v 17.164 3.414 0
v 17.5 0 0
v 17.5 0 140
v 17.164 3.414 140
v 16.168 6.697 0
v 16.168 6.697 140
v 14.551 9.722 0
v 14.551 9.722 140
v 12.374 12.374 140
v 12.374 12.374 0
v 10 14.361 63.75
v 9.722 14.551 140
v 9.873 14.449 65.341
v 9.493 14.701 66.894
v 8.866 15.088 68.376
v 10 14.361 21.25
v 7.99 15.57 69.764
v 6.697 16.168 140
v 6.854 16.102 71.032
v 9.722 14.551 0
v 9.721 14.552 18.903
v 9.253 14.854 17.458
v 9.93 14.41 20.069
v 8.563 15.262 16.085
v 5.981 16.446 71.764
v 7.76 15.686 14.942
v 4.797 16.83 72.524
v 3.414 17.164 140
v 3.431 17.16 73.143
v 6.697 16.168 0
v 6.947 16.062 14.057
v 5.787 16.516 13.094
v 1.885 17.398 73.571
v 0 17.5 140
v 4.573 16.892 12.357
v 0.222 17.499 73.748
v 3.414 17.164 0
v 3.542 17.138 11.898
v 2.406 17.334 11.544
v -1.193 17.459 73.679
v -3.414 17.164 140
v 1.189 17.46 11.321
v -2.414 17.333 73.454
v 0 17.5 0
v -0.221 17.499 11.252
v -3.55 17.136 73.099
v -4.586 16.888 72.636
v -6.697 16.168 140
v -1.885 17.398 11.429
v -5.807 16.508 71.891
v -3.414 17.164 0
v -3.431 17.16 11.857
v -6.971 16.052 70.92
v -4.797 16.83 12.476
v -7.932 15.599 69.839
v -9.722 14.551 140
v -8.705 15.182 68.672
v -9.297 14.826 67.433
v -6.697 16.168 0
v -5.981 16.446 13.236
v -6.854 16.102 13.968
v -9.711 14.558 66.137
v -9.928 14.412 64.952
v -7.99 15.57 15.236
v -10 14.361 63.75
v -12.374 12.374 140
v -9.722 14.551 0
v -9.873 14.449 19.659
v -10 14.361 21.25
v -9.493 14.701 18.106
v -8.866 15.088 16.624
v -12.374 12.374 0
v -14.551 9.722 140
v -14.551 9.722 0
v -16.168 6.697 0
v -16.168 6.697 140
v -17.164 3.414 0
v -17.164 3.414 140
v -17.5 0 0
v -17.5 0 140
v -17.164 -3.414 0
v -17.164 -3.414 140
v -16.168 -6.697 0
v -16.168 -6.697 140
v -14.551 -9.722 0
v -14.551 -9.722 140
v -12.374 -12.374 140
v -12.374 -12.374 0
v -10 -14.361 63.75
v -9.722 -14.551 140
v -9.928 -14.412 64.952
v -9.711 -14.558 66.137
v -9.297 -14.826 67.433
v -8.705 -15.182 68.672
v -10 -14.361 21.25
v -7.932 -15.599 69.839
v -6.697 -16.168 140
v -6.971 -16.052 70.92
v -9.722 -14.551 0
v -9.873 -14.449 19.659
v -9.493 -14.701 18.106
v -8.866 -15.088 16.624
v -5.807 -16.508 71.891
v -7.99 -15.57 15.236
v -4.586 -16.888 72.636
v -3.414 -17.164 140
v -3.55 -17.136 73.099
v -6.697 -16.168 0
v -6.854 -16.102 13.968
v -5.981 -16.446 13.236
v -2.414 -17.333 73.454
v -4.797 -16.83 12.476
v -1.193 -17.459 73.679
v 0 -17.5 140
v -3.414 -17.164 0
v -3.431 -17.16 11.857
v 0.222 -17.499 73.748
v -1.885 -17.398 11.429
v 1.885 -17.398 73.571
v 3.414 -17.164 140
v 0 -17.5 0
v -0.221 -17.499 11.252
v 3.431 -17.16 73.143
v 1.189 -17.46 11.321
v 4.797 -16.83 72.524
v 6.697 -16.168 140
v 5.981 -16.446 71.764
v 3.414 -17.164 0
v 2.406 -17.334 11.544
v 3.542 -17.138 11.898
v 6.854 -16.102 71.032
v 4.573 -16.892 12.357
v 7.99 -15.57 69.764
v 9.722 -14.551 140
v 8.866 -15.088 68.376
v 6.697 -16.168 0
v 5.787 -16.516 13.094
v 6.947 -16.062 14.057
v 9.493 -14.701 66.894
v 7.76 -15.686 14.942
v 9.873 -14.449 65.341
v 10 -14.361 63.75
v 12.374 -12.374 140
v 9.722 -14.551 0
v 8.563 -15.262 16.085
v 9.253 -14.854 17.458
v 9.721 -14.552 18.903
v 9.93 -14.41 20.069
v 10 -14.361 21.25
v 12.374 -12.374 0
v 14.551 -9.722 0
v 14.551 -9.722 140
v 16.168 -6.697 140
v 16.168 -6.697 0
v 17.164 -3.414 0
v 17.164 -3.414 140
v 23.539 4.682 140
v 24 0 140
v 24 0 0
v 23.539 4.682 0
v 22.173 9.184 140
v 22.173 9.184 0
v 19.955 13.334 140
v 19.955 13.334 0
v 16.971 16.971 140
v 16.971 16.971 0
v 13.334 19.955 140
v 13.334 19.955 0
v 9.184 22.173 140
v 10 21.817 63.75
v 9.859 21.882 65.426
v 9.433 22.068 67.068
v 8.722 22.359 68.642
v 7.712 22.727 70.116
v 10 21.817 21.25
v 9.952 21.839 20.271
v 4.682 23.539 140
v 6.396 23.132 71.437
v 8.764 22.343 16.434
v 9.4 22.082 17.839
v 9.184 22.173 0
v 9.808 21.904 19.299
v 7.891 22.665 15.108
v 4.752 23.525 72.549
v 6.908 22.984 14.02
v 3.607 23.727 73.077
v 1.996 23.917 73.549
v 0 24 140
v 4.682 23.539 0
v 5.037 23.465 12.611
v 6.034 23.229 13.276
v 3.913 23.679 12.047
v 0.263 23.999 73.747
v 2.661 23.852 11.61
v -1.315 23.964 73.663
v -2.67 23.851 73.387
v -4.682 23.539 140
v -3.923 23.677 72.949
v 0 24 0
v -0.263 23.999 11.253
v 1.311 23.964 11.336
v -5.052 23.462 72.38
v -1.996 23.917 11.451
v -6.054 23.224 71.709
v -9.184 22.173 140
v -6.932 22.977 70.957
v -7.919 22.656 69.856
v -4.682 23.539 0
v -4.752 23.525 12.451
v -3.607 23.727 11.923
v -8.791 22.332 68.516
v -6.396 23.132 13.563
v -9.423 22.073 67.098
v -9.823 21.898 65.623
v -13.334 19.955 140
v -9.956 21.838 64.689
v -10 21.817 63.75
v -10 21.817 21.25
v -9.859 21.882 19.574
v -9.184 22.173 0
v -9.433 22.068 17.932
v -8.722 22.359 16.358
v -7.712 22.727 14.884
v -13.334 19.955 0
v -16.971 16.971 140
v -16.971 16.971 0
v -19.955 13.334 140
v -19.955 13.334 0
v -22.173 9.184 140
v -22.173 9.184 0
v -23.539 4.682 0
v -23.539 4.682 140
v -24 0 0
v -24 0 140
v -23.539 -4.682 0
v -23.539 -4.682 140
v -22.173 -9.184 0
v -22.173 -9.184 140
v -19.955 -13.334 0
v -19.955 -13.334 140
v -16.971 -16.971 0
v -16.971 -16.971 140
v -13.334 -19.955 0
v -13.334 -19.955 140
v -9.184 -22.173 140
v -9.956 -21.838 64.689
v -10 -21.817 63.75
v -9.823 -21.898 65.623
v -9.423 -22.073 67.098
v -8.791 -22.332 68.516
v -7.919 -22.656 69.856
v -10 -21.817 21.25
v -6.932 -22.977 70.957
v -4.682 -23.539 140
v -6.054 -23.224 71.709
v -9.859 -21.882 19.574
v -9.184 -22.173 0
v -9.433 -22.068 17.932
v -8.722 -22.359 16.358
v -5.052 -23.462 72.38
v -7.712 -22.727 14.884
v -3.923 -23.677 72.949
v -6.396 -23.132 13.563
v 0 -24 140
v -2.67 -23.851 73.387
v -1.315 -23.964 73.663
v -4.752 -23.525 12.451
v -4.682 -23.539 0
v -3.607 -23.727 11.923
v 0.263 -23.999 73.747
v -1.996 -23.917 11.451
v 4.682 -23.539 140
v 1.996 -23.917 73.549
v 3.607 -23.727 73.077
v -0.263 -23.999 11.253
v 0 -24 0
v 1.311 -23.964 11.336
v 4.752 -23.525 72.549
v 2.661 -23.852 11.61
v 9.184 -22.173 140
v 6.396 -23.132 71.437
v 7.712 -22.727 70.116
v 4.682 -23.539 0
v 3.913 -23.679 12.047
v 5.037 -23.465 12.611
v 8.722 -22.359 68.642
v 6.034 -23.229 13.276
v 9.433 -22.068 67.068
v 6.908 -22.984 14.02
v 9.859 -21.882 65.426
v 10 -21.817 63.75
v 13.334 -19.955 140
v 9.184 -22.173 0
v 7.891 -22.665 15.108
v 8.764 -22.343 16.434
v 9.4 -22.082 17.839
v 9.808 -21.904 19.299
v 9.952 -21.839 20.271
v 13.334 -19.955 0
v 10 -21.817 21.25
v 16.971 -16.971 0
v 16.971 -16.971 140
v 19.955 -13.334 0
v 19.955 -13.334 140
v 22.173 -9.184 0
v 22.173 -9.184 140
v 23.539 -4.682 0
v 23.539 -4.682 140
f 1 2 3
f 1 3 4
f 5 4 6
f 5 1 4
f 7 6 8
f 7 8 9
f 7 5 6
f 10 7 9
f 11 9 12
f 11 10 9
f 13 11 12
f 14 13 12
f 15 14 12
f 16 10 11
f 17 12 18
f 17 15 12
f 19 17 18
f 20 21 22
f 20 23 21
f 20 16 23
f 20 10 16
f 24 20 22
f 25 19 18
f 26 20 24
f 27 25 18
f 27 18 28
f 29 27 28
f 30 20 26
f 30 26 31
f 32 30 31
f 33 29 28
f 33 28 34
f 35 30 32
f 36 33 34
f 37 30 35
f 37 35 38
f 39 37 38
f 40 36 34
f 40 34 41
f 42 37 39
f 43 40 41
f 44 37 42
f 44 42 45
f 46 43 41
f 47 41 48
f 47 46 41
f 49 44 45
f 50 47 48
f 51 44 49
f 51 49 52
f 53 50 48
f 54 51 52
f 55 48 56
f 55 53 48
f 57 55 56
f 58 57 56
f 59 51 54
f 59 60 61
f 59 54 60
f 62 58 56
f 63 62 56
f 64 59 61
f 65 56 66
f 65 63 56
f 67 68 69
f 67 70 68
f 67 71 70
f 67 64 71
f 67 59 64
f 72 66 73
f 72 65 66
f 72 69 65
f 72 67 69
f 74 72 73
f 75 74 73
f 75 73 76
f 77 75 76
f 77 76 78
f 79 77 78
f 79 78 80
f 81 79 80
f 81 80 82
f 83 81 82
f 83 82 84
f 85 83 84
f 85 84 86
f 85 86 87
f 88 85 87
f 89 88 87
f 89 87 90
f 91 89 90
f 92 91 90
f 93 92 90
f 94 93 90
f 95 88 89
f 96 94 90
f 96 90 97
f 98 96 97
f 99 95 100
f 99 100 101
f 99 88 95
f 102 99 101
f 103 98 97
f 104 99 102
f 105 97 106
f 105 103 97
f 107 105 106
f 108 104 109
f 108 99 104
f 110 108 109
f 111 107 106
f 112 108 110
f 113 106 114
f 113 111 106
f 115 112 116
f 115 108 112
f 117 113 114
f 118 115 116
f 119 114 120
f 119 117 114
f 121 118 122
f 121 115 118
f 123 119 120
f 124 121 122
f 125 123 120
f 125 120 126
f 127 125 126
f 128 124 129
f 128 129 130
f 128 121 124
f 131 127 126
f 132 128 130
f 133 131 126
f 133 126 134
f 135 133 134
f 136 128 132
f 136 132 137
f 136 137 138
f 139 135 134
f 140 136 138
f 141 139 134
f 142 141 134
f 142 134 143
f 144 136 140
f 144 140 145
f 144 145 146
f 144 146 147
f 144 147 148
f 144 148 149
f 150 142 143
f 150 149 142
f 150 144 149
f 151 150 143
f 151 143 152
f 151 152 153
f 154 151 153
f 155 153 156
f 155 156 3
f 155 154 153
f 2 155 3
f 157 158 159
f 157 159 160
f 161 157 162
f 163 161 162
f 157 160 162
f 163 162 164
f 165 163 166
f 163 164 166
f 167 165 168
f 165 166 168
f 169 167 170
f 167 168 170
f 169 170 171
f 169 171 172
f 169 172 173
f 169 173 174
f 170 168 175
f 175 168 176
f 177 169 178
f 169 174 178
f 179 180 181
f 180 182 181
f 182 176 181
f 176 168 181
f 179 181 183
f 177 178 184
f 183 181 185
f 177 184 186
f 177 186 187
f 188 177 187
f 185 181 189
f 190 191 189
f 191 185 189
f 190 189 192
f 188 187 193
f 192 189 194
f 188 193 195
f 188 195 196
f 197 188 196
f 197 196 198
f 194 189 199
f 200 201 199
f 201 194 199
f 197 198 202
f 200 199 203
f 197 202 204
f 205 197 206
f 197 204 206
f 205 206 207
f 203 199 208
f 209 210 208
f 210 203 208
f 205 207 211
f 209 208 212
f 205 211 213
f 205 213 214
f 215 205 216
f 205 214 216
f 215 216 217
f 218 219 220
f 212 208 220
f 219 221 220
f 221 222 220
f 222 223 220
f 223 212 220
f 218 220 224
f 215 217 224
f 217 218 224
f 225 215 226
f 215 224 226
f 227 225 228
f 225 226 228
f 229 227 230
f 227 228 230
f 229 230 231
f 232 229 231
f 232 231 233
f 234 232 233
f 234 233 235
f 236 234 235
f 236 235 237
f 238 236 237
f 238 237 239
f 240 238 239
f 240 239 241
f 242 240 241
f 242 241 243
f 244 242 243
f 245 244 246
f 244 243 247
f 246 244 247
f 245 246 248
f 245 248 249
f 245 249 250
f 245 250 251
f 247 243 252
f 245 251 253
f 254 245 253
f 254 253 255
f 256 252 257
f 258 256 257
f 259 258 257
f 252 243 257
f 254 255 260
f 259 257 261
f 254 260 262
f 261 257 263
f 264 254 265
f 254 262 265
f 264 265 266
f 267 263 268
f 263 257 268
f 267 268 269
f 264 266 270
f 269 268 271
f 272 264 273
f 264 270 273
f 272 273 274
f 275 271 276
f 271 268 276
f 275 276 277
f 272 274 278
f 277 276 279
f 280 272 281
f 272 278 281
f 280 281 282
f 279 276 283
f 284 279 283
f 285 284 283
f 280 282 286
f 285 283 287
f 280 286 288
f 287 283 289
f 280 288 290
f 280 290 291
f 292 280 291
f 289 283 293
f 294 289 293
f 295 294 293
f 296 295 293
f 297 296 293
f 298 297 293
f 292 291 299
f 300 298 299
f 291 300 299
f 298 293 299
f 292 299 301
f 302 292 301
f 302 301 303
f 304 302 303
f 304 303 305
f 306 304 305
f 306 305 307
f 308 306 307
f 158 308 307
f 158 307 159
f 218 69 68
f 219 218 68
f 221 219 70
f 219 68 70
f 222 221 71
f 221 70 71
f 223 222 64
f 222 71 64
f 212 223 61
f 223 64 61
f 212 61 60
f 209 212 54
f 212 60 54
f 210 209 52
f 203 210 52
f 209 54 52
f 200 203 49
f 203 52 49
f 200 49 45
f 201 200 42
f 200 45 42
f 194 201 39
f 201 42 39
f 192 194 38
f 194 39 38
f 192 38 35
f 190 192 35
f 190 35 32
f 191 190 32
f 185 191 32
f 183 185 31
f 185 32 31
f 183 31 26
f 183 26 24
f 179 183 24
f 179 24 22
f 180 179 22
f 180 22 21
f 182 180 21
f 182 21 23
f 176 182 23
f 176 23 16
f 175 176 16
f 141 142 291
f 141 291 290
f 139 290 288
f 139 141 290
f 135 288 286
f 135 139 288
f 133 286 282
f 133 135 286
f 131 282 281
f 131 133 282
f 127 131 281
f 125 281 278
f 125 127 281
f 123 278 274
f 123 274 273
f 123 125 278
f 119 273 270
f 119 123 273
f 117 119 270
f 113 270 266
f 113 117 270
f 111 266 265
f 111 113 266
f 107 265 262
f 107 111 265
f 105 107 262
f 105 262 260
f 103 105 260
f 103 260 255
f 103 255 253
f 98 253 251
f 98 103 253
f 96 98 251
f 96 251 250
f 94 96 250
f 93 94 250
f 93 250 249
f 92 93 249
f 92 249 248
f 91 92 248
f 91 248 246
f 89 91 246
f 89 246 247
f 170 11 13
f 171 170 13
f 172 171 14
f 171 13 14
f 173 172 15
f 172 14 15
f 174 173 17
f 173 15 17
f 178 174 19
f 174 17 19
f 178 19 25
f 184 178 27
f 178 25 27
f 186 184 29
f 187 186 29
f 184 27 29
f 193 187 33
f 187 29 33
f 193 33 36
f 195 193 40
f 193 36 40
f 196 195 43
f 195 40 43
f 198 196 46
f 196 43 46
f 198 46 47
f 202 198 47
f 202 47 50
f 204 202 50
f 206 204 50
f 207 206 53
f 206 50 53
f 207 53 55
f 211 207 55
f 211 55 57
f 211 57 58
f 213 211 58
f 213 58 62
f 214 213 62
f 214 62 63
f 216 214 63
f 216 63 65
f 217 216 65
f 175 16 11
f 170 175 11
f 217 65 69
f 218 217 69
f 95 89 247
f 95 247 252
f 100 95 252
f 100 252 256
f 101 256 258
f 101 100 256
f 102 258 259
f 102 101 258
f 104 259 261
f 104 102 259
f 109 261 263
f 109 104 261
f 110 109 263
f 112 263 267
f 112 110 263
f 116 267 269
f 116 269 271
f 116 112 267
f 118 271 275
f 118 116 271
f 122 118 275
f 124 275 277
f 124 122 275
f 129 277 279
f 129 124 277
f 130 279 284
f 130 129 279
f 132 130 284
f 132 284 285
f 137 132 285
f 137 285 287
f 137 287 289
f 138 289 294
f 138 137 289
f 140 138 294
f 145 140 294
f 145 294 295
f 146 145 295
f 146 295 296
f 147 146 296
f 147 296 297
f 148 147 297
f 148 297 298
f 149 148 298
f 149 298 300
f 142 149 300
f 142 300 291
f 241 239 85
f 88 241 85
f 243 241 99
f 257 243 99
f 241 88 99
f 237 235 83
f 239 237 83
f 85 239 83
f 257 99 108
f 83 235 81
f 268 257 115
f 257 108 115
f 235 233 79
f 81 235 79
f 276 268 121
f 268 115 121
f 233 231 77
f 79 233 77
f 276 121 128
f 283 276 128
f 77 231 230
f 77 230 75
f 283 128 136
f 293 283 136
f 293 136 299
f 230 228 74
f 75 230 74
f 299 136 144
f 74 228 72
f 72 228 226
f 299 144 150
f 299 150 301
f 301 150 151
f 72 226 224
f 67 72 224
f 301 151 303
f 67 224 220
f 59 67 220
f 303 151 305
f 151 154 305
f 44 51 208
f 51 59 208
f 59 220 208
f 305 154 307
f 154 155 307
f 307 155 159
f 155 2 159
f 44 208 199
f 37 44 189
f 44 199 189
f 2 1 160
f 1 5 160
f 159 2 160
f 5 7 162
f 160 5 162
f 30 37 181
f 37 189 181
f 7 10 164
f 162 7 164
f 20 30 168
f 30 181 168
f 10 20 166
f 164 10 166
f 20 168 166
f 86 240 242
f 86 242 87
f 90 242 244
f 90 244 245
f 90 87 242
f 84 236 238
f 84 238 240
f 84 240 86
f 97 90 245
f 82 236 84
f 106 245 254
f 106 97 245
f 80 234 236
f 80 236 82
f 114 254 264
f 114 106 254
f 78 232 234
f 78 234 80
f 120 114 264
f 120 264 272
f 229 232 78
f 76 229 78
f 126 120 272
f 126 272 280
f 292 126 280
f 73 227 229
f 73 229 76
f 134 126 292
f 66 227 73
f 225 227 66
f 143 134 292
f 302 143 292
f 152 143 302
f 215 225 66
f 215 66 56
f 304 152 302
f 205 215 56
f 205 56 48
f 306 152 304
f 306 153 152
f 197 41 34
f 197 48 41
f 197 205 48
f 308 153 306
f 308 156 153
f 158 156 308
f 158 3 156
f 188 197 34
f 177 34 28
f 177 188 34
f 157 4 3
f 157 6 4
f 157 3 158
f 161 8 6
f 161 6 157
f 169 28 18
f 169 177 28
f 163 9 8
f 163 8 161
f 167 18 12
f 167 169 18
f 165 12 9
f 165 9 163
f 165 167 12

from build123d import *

# Parameters (mm, degrees)
F0_R          = 24
F0_R_2        = 17.5
F1_DEPTH      = 140
F3_DEPTH      = 24.001
F3_DEPTH_BACK = 24.001


with BuildPart() as f1:
    # F0 (on Top) → F1 (new body)
    with BuildSketch(Plane.XY):
        Circle(F0_R)
        Circle(F0_R_2, mode=Mode.SUBTRACT)
    extrude(amount=F1_DEPTH)

    # F2 (on Front) → F3 (cut, two sides)
    with BuildSketch(Plane.XZ) as f3_sk:
        with BuildLine():
            ThreePointArc((-10, 21.25), (0, 11.25), (10, 21.25))
            Line((10, 21.25), (10, 63.75))
            ThreePointArc((10, 63.75), (0, 73.75), (-10, 63.75))
            Line((-10, 63.75), (-10, 21.25))
        make_face()
    extrude(amount=-F3_DEPTH, mode=Mode.SUBTRACT)
    extrude(f3_sk.sketch, amount=F3_DEPTH_BACK, mode=Mode.SUBTRACT)


solid = f1.part
